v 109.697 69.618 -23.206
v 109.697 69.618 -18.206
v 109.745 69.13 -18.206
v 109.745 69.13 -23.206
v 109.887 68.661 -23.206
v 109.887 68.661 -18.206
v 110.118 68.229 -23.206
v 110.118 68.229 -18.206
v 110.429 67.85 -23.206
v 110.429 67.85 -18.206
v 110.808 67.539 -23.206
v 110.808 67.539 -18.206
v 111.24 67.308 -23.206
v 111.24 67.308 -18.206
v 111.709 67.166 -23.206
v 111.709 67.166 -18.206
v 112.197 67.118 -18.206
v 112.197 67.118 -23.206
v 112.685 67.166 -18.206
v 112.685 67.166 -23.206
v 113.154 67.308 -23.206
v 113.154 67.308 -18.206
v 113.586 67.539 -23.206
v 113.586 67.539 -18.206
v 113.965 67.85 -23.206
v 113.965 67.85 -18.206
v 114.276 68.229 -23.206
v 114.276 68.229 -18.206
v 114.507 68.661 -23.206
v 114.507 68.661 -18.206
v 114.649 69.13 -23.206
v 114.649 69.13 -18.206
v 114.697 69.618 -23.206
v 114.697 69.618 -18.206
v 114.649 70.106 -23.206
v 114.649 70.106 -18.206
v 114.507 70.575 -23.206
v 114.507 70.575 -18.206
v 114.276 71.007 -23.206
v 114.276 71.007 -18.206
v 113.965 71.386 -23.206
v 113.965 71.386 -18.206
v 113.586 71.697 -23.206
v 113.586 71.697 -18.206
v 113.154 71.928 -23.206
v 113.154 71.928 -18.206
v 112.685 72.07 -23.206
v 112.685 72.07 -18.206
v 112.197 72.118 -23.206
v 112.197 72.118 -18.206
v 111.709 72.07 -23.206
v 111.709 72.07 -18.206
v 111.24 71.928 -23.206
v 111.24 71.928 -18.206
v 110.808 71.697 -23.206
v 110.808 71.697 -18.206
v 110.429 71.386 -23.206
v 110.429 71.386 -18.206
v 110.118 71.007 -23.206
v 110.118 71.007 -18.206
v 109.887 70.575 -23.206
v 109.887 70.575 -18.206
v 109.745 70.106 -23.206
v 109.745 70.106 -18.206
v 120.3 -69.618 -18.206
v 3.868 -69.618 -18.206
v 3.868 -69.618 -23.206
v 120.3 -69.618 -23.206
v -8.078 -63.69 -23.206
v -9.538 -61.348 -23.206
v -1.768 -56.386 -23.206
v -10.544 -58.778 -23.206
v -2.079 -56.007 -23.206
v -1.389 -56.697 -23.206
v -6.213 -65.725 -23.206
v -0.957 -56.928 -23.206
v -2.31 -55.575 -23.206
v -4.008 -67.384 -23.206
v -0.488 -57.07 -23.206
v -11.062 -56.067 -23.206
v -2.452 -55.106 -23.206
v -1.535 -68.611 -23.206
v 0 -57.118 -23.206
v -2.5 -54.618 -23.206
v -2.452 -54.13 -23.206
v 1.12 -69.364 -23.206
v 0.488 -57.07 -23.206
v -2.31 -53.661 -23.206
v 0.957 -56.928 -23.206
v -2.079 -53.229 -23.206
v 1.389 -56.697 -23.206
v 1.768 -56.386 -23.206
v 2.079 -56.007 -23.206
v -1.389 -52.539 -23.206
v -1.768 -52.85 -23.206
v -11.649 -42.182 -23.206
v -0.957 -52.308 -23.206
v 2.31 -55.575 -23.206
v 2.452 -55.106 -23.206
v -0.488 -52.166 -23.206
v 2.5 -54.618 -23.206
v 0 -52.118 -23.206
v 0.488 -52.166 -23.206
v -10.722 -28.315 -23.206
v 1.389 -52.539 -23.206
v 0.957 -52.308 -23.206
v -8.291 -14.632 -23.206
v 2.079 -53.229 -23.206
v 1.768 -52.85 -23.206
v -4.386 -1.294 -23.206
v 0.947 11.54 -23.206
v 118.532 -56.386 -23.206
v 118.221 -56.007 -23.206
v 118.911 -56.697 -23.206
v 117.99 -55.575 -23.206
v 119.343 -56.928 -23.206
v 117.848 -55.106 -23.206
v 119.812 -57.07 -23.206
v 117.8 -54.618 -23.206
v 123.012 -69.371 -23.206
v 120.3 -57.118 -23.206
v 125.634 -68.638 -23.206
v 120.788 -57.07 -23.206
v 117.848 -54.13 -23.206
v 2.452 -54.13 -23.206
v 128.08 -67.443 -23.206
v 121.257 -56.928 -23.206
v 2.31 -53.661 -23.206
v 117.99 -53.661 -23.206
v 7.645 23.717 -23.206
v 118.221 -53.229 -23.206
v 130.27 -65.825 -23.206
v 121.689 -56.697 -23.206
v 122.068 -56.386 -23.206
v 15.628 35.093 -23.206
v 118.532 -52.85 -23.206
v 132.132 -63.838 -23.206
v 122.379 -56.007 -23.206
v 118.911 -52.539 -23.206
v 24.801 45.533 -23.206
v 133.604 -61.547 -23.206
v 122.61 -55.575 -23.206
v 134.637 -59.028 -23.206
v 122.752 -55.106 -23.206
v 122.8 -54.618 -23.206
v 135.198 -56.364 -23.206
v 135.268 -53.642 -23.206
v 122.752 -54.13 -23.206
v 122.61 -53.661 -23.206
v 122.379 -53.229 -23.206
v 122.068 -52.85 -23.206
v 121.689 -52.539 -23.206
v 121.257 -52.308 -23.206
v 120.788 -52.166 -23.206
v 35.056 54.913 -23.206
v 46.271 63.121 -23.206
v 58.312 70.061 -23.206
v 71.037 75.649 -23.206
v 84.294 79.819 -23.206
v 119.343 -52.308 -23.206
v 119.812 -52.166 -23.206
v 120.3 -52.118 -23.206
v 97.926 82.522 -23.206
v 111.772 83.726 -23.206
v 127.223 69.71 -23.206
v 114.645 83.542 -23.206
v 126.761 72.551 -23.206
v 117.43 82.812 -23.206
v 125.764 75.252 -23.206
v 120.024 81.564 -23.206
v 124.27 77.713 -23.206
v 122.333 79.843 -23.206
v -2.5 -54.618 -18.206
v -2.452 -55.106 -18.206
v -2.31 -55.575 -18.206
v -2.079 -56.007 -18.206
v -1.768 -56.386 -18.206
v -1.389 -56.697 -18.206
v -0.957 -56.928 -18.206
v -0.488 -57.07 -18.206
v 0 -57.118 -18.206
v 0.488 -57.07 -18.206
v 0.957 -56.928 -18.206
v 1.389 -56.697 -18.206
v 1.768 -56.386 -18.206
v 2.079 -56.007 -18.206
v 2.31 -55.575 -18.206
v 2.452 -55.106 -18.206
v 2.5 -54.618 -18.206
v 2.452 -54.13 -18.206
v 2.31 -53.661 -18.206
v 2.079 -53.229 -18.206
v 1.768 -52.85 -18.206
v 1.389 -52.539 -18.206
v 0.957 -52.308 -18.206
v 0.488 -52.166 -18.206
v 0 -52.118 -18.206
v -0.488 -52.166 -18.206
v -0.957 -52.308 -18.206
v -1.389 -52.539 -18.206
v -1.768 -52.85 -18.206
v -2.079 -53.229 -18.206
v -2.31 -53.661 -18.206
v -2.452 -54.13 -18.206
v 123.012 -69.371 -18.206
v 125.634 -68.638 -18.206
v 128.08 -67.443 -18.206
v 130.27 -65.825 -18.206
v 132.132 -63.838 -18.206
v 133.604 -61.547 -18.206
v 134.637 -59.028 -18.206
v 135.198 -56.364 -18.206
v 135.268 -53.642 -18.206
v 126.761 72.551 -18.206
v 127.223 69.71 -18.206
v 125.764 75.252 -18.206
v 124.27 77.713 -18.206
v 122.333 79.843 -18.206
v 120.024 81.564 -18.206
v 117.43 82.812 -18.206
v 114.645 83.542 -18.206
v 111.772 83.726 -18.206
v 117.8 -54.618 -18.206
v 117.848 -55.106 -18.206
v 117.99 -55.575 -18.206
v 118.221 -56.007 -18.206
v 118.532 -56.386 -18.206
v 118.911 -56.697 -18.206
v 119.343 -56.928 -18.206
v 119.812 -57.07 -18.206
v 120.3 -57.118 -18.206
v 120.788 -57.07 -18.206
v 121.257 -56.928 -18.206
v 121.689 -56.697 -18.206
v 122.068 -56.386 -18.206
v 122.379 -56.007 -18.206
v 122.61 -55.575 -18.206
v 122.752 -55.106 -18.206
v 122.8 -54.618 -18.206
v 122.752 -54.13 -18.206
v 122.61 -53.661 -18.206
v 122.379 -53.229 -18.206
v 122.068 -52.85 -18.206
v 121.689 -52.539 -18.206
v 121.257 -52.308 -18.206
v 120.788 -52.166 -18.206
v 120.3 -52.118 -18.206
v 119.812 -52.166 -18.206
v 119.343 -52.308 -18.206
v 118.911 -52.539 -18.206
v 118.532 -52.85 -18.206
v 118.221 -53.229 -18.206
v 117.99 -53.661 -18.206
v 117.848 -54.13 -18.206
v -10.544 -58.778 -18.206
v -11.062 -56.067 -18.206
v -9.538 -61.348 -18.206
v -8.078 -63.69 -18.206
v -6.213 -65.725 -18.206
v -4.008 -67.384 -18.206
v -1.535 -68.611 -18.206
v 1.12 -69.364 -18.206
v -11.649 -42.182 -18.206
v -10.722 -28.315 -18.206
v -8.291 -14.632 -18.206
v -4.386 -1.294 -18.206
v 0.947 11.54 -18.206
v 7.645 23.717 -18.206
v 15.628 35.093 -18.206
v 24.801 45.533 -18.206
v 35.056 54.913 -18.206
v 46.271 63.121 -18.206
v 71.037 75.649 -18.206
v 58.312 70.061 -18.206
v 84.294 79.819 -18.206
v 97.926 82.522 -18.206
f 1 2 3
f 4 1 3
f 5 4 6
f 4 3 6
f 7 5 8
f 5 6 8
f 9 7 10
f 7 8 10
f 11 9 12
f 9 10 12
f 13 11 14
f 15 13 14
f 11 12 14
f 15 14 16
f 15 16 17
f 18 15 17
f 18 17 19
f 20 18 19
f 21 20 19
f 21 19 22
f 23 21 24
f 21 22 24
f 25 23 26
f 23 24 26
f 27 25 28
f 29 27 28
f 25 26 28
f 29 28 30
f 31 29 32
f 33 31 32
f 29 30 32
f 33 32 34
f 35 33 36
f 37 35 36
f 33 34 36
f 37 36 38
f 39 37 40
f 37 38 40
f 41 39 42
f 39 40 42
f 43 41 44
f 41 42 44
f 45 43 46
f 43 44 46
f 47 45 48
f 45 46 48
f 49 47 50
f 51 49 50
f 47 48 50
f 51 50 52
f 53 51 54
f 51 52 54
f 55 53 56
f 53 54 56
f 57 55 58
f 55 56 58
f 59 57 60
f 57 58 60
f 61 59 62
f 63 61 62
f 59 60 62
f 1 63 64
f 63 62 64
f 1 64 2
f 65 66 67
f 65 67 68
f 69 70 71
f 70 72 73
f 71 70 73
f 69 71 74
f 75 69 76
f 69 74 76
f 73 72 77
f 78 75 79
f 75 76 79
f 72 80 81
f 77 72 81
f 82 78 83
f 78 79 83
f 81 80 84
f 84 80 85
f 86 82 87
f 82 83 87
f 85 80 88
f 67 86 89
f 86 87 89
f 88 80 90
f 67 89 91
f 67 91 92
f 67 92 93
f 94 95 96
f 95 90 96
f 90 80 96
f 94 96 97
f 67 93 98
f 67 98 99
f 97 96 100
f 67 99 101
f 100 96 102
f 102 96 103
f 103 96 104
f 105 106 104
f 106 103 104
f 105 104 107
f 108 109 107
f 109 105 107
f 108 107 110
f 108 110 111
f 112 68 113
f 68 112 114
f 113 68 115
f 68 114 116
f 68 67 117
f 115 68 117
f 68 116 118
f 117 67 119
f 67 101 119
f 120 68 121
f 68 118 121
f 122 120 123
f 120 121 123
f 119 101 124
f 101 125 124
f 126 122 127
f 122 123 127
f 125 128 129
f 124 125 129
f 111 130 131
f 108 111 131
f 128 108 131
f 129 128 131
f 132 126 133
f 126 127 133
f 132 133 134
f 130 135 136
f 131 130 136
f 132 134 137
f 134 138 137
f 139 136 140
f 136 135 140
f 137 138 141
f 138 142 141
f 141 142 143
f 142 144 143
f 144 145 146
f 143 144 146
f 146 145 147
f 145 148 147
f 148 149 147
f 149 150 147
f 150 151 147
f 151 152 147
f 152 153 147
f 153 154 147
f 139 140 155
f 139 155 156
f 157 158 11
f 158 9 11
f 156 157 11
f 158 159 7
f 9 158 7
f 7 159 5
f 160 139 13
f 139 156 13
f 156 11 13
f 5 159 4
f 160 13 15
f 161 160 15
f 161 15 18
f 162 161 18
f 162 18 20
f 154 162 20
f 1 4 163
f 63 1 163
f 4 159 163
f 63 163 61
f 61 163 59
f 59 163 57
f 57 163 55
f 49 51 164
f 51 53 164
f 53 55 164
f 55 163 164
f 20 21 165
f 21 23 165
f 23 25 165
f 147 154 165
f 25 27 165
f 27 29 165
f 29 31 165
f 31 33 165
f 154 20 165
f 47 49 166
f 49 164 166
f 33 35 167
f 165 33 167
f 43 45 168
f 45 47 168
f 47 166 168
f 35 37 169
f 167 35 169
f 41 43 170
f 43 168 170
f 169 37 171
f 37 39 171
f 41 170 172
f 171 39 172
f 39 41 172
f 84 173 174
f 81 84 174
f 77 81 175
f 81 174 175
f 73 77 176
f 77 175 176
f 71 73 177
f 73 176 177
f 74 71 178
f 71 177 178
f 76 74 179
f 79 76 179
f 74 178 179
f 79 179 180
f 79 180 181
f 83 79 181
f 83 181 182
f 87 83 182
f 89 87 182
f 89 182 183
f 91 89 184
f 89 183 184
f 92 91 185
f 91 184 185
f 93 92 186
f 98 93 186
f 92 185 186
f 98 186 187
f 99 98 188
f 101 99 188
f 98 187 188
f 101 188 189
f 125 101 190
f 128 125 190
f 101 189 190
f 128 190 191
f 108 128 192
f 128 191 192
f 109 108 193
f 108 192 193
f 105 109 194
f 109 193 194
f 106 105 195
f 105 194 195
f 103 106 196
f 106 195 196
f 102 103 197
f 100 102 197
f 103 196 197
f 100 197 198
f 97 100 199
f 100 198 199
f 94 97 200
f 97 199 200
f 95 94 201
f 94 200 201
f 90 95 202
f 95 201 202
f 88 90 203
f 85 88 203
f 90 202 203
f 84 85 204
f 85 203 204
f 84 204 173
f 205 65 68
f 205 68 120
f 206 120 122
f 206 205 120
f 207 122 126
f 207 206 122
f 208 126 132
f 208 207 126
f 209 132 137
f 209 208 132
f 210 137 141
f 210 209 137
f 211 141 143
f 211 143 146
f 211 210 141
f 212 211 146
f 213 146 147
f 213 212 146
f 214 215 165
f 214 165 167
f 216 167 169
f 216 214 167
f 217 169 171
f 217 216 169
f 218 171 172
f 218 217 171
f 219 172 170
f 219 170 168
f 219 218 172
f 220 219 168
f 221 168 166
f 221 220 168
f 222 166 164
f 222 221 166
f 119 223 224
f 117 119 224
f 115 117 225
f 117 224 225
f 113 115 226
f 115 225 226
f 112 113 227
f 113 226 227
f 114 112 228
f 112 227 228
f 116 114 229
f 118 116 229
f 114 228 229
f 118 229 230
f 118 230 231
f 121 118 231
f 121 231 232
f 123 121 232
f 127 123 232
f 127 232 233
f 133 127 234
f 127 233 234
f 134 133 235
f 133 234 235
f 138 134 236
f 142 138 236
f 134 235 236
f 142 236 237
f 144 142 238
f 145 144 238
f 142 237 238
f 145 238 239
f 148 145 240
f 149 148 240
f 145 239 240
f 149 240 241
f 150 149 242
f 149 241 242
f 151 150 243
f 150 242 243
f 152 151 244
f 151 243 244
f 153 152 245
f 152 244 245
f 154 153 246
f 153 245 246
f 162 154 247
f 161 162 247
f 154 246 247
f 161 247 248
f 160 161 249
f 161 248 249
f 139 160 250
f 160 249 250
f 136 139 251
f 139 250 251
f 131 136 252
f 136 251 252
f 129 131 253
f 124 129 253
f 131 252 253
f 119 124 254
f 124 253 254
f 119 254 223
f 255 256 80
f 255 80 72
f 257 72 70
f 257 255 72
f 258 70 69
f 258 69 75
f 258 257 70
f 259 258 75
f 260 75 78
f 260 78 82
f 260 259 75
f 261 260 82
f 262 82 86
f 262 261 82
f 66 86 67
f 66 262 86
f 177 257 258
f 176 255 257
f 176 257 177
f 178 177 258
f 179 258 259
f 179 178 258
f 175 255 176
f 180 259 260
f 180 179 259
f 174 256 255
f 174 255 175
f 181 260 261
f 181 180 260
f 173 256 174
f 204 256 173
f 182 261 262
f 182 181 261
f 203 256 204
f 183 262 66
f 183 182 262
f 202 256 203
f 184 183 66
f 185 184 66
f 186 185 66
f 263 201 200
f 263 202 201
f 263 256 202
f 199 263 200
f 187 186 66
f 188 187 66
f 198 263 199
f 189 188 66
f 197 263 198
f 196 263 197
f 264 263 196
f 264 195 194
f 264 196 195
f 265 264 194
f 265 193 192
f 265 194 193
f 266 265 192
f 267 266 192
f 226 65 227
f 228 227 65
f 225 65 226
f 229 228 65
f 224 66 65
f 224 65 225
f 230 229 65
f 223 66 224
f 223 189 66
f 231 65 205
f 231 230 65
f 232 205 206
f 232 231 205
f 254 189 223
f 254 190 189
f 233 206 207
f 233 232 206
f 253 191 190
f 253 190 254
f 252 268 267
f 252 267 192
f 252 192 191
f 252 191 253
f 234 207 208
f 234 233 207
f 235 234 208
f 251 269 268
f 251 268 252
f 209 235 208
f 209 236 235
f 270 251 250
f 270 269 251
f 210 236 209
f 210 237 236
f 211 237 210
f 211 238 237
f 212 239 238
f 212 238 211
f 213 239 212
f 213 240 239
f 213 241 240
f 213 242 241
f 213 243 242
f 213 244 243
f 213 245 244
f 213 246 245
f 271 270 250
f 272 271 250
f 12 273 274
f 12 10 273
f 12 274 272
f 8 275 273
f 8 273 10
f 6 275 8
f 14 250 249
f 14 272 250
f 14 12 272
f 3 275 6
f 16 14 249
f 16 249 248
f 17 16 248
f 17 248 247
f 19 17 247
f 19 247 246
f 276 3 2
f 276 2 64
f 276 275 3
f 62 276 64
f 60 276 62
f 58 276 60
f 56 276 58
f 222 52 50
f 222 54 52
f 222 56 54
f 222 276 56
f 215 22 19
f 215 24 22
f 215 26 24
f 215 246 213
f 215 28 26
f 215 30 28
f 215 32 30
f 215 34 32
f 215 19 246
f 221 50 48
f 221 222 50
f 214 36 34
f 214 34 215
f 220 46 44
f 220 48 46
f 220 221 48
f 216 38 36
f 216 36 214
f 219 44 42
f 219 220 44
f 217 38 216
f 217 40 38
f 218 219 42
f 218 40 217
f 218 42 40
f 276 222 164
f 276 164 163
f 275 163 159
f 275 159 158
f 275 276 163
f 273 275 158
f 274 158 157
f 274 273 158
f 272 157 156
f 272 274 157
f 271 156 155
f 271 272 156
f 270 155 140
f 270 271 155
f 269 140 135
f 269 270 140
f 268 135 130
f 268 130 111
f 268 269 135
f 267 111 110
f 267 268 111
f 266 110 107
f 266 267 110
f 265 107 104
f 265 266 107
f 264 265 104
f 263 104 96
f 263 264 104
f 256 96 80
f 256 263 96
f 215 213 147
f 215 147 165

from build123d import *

# Parameters (mm, degrees)
SKETCH_1_R      = 2.5
EXTRUDE_1_DEPTH = 5


with BuildPart() as part:
    # 草图1 → 凸台-拉伸1 (new body)
    with BuildSketch(Plane.XY.offset(-18.206005243)):
        with BuildLine():
            Line((3.867902109, -69.618015729), (120.299999998, -69.618015729))
            ThreePointArc((120.299999998, -69.618015729), (131.246322711, -64.87364925), (135.268196544, -53.641751587))
            Line((135.268196544, -53.641751587), (127.222902207, 69.709644702))
            ThreePointArc((127.222902207, 69.709644702), (122.332732456, 79.843437948), (111.771655863, 83.725600612))
            ThreePointArc((111.771655863, 83.725600612), (20.072255788, 40.438021966), (-11.06192974, -56.06719515))
            ThreePointArc((-11.06192974, -56.06719515), (-6.21332571, -65.725168634), (3.867902109, -69.618015729))
        make_face()
        with Locations(Location((120.299999998, -54.618015744, 0), (0, 0, 180))):
            Circle(SKETCH_1_R, mode=Mode.SUBTRACT)
        with Locations(Location((112.197007482, 69.618015729, 0), (0, 0, 180))):
            Circle(SKETCH_1_R, mode=Mode.SUBTRACT)
        with Locations(Location((0, -54.618015729, 0), (0, 0, 180))):
            Circle(SKETCH_1_R, mode=Mode.SUBTRACT)
    extrude(amount=-EXTRUDE_1_DEPTH)


solid = part.part
